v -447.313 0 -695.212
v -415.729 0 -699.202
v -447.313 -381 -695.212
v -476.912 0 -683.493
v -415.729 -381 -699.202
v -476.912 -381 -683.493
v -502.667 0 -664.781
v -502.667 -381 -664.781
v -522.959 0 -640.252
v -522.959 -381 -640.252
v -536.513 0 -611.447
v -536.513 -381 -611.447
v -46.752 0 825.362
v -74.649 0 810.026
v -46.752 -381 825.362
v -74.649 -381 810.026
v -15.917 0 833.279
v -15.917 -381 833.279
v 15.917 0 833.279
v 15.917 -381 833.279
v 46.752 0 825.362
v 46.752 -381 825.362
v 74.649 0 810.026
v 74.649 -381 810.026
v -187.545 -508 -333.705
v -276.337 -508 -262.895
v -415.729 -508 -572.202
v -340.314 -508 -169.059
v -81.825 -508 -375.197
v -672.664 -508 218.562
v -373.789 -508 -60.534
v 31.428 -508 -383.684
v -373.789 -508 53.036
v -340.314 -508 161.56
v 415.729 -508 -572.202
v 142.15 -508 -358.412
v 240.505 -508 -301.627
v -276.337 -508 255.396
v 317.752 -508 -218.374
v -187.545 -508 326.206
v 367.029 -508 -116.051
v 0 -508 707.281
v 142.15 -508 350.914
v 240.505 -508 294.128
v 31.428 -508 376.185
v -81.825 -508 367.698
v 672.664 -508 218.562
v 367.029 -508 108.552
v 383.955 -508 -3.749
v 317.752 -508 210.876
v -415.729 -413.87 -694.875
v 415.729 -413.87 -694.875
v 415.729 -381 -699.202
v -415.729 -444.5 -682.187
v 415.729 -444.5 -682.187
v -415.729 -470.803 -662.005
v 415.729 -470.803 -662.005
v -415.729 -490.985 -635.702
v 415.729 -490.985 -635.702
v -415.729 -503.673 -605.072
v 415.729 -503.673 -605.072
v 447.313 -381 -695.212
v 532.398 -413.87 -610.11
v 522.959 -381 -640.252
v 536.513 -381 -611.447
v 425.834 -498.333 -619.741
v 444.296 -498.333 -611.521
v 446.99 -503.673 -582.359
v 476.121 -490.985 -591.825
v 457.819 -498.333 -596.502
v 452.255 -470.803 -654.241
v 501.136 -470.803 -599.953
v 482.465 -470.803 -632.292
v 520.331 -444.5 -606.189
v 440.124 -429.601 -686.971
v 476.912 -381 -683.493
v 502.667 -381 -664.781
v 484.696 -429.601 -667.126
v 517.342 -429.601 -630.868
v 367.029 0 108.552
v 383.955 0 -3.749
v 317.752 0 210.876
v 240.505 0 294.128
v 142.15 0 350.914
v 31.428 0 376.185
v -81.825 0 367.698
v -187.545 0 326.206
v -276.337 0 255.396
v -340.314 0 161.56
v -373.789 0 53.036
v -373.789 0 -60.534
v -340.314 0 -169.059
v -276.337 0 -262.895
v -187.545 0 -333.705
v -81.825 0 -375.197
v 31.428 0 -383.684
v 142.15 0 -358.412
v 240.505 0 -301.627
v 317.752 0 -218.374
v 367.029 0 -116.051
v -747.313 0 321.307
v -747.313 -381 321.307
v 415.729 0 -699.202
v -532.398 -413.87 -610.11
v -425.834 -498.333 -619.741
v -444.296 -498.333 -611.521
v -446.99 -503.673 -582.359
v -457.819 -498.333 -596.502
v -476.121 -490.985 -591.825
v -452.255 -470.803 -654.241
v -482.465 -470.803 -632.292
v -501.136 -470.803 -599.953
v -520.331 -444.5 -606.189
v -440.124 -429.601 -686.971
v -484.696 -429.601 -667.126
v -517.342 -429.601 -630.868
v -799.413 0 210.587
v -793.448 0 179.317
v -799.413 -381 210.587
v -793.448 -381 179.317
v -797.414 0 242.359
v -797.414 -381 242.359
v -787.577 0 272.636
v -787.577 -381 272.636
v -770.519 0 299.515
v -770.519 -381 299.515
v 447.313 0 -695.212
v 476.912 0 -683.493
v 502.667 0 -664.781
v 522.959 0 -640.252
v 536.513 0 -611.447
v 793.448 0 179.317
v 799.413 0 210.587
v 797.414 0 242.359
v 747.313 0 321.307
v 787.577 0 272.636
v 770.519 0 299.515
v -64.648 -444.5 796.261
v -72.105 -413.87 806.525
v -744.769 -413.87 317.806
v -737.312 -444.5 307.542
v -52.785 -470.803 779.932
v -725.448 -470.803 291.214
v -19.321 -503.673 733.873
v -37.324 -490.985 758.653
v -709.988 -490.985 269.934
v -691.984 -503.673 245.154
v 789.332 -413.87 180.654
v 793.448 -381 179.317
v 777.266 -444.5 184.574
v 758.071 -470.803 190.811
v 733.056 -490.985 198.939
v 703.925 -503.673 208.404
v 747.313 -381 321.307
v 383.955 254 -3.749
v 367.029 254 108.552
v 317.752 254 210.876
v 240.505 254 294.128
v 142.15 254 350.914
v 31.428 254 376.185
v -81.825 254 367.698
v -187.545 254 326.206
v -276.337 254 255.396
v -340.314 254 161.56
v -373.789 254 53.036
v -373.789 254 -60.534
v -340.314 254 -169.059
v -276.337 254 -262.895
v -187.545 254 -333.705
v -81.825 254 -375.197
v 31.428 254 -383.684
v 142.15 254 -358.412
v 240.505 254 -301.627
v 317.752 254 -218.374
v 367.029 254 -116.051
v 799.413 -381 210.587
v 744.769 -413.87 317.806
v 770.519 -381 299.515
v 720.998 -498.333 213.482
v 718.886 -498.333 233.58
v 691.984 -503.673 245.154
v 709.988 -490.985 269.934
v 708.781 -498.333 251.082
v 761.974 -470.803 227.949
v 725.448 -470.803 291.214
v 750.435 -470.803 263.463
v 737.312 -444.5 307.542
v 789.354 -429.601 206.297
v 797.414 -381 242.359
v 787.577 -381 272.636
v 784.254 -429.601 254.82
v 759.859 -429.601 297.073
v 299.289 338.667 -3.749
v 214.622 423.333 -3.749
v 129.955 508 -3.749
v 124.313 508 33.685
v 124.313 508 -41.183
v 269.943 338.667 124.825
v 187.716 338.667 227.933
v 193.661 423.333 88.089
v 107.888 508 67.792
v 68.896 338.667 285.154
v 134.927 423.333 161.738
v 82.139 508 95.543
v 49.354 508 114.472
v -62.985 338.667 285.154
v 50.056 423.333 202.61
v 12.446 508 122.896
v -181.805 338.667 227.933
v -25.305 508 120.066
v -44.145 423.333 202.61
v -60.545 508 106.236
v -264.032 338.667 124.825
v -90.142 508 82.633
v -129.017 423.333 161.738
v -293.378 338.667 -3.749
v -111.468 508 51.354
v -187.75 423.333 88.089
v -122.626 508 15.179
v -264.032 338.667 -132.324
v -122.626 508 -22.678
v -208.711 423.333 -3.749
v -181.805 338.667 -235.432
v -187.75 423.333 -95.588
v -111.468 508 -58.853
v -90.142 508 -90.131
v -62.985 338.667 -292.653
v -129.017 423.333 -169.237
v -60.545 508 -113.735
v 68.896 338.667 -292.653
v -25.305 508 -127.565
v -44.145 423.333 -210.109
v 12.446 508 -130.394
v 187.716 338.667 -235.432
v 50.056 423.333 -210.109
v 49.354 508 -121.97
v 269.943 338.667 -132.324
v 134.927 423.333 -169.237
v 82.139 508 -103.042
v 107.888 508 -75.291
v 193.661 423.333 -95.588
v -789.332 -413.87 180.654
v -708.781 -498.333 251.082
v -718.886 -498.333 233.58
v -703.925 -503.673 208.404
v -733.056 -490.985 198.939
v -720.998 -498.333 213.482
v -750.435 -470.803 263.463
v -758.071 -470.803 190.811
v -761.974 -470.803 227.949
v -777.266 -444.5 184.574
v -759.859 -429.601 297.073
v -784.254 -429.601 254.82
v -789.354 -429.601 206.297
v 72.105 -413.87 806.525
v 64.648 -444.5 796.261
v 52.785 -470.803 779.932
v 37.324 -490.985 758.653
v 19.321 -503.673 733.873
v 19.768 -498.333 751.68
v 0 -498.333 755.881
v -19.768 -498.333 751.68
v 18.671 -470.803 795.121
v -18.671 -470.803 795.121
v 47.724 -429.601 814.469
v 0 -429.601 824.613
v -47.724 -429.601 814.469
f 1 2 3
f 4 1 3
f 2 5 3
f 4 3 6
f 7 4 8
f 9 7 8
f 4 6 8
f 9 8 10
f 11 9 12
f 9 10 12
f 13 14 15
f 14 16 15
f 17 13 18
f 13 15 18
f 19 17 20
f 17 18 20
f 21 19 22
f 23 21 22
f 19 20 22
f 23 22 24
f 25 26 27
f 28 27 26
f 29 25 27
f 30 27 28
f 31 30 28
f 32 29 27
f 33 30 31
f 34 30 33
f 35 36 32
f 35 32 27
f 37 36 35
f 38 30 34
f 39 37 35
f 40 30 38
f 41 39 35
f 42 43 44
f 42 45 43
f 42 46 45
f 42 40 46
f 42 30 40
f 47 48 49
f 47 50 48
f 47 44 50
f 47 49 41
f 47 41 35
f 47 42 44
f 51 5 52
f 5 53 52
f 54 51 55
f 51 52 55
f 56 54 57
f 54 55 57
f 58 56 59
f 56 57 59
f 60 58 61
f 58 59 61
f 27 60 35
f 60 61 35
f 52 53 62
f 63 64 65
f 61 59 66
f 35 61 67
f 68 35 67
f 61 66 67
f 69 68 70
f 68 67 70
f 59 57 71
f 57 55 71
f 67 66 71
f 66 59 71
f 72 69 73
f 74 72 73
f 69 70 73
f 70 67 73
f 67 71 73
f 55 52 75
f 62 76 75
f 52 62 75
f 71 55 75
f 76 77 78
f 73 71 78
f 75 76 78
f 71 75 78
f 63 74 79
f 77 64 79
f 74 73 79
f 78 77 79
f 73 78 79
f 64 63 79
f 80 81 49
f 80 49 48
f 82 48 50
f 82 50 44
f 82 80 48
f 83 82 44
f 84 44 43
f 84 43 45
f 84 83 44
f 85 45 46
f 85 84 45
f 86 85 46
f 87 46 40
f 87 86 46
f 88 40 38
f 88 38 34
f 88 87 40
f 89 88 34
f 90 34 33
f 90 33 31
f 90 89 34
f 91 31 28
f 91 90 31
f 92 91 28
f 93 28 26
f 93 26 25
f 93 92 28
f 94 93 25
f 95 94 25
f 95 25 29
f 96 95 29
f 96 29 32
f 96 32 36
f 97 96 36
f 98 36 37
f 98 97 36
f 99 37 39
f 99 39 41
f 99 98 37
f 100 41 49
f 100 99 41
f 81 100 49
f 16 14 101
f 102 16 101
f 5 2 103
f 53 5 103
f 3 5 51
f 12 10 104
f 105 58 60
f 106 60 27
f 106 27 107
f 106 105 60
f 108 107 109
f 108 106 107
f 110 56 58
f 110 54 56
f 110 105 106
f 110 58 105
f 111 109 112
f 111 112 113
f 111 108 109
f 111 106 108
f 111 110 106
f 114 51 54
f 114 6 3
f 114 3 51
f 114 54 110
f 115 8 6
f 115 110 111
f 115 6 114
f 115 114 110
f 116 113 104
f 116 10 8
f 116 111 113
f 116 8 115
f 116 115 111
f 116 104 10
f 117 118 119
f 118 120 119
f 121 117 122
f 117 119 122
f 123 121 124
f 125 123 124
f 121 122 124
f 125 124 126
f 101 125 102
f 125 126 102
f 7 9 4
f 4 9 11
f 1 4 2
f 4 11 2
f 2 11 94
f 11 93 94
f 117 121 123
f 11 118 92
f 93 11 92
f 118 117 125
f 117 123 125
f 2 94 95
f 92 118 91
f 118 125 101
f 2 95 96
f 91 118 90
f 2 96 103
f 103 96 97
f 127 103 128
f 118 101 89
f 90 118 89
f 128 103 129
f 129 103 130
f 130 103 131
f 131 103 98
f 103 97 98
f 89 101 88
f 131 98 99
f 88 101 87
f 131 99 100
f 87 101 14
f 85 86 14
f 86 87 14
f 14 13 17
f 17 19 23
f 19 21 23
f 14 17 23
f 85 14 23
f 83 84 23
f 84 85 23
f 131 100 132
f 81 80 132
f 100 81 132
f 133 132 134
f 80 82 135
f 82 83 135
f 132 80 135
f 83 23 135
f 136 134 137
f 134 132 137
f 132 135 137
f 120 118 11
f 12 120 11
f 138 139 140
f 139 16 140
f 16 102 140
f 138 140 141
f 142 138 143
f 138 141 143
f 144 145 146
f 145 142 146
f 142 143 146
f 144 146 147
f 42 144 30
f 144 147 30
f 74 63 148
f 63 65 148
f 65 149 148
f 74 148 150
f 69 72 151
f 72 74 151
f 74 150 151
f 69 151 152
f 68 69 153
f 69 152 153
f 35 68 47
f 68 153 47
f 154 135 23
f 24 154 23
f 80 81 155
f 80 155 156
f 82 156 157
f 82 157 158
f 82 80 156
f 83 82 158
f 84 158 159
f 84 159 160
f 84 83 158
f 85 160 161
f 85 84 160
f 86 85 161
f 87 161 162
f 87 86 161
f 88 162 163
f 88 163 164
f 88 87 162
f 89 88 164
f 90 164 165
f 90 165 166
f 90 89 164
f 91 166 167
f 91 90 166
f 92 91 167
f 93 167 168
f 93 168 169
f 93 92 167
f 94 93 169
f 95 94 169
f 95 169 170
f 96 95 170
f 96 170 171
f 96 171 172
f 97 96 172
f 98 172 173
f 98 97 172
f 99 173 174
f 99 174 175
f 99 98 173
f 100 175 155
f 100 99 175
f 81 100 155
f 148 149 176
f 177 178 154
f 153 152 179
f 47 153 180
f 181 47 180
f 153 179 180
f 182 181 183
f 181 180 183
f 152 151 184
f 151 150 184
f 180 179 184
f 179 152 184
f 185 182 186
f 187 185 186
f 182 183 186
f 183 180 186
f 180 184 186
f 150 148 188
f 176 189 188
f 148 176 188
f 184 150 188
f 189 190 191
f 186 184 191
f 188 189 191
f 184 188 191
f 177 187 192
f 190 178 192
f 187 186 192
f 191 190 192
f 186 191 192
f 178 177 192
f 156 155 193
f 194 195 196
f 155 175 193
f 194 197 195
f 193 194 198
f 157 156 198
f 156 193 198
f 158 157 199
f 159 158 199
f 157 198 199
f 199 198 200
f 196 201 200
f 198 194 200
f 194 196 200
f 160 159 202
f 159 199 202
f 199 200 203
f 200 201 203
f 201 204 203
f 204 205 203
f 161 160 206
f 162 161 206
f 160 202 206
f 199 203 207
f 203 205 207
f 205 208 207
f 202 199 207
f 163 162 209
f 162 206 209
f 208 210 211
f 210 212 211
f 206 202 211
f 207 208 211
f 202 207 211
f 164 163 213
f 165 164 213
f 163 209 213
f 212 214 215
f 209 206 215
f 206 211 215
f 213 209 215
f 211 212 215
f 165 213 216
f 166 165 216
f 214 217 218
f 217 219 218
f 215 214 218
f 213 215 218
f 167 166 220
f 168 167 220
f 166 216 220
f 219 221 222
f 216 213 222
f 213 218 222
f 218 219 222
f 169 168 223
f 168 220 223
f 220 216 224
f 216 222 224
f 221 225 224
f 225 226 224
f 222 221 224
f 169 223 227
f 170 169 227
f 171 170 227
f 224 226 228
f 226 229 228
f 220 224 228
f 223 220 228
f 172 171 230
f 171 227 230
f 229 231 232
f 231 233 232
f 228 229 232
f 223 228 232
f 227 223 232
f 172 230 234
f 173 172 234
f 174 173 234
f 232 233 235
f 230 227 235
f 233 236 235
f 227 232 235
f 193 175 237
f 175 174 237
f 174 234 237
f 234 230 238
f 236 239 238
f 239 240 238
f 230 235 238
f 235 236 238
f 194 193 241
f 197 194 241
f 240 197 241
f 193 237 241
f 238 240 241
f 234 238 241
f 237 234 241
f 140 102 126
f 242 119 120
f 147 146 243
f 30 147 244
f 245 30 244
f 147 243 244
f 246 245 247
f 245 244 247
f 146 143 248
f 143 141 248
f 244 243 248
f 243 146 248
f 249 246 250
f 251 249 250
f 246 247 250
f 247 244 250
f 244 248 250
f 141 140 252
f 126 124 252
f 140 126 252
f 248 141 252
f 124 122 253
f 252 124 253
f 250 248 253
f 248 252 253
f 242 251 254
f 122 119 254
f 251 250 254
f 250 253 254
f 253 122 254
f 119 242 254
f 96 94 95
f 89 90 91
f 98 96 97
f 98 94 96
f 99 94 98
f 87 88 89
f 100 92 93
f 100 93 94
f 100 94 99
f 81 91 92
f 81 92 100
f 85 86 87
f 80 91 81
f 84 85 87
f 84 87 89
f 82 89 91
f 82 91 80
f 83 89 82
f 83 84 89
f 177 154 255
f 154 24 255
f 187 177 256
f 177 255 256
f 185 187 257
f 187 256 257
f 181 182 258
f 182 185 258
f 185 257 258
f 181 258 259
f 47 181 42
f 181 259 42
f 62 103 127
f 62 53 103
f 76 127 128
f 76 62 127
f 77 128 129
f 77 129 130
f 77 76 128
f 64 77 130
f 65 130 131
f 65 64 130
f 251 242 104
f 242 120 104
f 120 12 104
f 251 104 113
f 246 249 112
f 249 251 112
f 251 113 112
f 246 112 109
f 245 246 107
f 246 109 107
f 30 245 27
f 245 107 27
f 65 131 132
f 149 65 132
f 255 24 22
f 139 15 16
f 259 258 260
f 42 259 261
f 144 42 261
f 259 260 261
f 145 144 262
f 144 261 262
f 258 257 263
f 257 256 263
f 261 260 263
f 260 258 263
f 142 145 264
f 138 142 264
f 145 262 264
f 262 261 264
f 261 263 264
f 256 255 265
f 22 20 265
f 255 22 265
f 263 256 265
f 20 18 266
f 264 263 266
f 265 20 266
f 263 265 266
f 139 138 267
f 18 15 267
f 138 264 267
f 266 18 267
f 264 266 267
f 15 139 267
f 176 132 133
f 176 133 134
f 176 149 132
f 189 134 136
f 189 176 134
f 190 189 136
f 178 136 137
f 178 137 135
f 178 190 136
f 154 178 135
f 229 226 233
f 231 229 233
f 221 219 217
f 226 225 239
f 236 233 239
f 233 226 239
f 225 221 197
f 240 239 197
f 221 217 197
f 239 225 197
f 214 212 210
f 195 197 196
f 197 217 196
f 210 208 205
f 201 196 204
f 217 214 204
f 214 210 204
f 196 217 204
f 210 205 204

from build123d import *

# Parameters (mm, degrees)
F0_R     = 381
F1_DEPTH = 508
F2_R     = 127
F3_DEPTH = 508
F4_SIZE  = 254


with BuildPart() as f1:
    # F0 (on Front) → F1 (new body)
    with BuildSketch(Plane.XZ):
        Polygon((-508, -699.2020155994), (508, -699.2020155994), (821.9612662849, 267.0714049565), (0, 864.2612212857), (-821.9612662849, 267.0714049565), align=None)
        with Locations((2.955440199, -3.7493463606)):
            Circle(F0_R, mode=Mode.SUBTRACT)
    extrude(amount=F1_DEPTH)

    # F2
    f2_edges = [f1.edges().sort_by_distance(p)[0] for p in [
        (508, -254, -699.202016),
        (821.961266, -254, 267.071405),
        (0, -254, 864.261221),
        (-821.961266, -254, 267.071405),
        (-508, -254, -699.202016),
        (0, -508, -699.202016),
        (664.980633, -508, -216.065305),
        (410.980633, -508, 565.666313),
        (-410.980633, -508, 565.666313),
        (-664.980633, -508, -216.065305),
    ]]
    fillet(f2_edges, radius=F2_R)

    # F0 (on Front) → F3 (join)
    with BuildSketch(Plane.XZ):
        with Locations((2.955440199, -3.7493463606)):
            Circle(F0_R)
    extrude(amount=-F3_DEPTH)

    # F4
    f4_edges = [f1.edges().sort_by_distance(p)[0] for p in [
        (-378.04456, 508, -3.749346),
    ]]
    chamfer(f4_edges, length=F4_SIZE)


solid = f1.part
